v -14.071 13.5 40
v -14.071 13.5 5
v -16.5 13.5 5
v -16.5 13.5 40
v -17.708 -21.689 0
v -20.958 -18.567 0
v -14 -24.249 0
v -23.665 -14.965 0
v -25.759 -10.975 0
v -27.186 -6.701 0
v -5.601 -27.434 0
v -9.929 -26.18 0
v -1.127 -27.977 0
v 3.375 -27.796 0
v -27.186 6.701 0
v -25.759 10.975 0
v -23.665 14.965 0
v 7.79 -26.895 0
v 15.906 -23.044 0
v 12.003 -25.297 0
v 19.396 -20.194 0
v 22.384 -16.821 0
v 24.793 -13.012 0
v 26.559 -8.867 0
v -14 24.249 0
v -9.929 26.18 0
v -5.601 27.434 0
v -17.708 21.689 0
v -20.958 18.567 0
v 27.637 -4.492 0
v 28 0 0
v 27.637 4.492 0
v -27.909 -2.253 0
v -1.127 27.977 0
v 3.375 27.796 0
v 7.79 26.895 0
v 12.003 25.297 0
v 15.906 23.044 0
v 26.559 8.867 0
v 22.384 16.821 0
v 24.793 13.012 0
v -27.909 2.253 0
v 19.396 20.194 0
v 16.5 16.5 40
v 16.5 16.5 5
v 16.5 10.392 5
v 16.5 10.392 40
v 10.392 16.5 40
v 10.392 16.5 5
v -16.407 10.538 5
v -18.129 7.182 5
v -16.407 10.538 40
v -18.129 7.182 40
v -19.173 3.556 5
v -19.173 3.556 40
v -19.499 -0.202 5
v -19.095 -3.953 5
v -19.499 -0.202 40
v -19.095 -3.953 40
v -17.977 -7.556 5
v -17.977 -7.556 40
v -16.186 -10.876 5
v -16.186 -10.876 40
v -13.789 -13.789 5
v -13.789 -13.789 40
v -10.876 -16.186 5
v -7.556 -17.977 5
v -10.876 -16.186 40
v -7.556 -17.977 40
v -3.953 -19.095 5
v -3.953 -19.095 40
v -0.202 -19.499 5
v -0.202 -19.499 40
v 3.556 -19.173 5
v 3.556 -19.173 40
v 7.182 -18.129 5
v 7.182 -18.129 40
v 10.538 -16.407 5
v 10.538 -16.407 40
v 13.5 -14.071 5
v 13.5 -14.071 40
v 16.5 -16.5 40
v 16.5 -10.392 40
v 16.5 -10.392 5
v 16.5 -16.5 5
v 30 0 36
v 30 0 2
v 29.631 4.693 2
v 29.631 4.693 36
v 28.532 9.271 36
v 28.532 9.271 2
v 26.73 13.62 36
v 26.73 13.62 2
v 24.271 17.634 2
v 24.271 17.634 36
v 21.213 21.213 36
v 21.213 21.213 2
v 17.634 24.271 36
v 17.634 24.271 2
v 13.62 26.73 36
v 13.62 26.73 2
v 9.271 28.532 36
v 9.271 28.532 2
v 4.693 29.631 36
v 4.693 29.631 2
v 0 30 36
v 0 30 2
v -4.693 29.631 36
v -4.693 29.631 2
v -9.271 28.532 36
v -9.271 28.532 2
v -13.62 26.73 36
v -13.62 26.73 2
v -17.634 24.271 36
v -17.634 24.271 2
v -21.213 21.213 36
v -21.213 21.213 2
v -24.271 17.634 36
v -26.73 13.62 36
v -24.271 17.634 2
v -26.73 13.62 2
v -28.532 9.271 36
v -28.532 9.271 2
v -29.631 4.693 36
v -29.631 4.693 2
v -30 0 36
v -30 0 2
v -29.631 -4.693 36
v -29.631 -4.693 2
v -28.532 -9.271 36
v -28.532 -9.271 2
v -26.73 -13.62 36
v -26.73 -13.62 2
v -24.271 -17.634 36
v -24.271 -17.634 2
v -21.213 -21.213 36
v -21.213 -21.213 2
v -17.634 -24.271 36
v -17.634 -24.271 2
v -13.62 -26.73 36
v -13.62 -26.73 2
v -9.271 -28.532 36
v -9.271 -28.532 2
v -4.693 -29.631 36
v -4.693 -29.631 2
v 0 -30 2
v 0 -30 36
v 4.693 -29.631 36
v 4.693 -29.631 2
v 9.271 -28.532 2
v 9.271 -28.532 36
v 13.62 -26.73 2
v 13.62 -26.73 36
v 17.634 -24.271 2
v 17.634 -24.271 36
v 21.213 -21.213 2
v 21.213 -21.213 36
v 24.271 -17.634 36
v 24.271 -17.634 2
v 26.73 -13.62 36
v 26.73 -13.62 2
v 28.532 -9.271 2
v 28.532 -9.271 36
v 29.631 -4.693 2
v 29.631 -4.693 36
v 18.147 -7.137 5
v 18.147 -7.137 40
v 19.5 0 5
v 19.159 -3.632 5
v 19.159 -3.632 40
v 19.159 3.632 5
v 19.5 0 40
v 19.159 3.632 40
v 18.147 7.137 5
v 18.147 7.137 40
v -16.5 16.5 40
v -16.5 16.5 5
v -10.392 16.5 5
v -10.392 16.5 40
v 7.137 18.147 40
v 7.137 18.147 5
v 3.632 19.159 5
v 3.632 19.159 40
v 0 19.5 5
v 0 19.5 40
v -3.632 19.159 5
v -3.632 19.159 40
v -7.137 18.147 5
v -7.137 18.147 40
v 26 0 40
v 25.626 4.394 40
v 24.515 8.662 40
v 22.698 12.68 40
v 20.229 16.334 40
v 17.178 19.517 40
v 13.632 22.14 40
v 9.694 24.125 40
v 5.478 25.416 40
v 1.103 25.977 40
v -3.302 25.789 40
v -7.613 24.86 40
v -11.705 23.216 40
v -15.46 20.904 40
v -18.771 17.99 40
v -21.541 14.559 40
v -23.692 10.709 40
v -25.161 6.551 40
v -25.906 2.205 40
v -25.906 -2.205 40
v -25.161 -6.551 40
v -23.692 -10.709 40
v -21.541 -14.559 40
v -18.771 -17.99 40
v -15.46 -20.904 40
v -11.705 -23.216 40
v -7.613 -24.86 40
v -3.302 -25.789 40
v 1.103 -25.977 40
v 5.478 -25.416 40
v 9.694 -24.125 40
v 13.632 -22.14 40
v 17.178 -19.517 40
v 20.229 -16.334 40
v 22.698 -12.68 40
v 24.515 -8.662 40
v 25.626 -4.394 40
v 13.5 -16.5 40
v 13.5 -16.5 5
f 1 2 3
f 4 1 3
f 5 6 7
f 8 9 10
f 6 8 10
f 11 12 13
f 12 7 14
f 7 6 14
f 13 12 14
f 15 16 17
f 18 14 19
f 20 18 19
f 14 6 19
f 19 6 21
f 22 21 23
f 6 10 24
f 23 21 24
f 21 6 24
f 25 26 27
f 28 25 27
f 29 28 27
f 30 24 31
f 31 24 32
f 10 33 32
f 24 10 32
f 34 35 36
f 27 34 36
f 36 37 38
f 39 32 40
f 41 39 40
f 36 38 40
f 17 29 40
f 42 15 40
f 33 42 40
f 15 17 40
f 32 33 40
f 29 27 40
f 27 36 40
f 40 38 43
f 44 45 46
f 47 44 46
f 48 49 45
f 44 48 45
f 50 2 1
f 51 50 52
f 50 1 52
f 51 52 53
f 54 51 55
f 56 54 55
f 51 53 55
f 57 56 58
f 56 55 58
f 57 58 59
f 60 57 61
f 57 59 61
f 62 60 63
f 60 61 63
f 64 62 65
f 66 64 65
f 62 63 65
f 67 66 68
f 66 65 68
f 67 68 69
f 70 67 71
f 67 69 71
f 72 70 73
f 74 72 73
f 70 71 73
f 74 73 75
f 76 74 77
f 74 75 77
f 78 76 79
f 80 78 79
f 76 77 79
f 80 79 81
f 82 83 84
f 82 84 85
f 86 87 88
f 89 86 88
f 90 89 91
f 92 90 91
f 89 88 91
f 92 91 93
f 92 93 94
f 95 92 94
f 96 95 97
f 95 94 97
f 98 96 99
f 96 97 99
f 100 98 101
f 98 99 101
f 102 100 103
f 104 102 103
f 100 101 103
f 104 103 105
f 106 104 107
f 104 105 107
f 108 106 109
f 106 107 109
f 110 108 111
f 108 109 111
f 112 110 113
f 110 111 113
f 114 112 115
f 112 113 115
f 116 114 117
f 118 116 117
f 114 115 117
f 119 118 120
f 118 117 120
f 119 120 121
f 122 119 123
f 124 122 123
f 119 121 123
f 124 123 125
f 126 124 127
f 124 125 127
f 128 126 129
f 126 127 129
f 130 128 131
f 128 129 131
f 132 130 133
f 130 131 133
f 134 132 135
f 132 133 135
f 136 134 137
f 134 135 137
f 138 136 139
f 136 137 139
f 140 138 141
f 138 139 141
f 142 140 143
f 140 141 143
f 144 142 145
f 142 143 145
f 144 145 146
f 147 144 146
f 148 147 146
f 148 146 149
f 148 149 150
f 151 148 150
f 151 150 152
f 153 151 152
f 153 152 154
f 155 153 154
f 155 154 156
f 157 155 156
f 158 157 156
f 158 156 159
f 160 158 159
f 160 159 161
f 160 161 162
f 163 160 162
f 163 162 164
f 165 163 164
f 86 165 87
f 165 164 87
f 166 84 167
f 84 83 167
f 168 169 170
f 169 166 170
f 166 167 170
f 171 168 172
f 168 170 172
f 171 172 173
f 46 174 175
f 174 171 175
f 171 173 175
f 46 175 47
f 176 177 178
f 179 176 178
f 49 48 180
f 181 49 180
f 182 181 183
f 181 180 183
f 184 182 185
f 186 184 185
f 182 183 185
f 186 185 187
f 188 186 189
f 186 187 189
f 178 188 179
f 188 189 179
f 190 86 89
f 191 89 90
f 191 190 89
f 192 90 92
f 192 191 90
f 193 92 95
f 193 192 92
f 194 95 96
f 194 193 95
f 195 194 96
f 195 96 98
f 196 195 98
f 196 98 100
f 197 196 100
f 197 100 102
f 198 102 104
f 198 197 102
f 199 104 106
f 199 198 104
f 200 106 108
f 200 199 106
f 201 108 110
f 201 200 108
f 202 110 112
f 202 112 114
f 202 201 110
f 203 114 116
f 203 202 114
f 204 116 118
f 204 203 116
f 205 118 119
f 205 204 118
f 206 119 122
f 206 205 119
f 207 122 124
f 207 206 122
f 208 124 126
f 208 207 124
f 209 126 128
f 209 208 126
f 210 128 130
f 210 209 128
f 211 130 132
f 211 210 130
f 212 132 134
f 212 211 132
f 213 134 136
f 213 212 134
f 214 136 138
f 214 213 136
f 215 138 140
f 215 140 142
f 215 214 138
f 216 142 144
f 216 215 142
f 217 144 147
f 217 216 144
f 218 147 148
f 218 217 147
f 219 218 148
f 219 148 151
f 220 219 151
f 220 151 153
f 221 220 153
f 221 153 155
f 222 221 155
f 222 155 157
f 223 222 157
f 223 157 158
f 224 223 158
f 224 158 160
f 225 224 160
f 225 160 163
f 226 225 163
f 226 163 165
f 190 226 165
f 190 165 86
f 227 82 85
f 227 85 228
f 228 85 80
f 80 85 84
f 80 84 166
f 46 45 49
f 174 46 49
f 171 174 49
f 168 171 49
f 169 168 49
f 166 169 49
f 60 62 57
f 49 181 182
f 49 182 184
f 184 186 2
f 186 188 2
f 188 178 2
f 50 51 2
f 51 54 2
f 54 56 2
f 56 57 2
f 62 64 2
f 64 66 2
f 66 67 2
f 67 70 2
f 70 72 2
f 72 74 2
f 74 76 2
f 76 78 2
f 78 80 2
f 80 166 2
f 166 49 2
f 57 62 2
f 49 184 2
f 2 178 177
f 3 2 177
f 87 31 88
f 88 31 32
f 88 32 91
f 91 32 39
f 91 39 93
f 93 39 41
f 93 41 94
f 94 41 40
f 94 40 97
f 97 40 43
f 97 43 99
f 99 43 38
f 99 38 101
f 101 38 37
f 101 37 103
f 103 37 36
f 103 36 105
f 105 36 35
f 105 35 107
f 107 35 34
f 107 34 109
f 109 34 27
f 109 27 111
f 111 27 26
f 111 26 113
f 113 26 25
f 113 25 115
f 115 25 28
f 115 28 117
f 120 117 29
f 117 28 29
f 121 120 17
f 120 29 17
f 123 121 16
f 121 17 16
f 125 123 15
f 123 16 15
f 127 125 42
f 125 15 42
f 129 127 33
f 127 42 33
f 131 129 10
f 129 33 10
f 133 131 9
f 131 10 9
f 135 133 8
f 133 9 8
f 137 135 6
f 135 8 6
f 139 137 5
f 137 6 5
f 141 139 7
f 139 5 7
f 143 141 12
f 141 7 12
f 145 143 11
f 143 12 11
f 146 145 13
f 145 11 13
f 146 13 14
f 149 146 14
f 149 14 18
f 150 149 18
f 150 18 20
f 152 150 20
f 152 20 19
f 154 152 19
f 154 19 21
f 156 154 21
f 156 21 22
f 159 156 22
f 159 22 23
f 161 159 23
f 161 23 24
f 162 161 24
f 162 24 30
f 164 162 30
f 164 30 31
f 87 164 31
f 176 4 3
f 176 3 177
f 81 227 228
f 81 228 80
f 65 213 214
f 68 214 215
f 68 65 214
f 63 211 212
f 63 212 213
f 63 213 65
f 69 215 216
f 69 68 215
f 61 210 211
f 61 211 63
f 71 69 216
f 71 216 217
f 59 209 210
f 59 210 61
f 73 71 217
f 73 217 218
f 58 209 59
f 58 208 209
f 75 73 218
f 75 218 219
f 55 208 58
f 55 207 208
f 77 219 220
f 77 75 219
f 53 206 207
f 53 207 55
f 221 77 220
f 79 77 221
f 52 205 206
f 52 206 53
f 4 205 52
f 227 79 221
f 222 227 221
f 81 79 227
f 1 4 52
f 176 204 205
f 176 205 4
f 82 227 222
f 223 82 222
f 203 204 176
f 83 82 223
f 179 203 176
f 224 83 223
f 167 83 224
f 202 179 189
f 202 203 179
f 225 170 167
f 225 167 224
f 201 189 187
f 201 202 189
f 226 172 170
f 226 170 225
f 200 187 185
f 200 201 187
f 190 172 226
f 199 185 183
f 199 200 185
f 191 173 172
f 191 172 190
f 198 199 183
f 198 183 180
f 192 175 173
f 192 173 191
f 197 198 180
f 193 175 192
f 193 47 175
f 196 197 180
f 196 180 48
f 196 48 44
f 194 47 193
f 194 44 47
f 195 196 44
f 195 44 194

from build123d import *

# Parameters (mm, degrees)
SKETCH_R        = 30
PAD_DEPTH       = 40
POCKET_DEPTH    = 35
SKETCH002_R     = 19.5
POCKET001_DEPTH = 35
CHAMFER_SIZE    = 4
CHAMFER001_SIZE = 2


with BuildPart() as part:
    # Sketch → Pad (new body)
    with BuildSketch(Plane.XY):
        Circle(SKETCH_R)
    extrude(amount=PAD_DEPTH)

    # Sketch001 (on Face3 of Pad) → Pocket (cut)
    with BuildSketch(Plane.XY.offset(40)):
        Polygon((-16.5, 16.5), (16.5, 16.5), (16.5, -16.5), (13.5, -16.5), (13.5, 13.5), (-16.5, 13.5), align=None)
    extrude(amount=-POCKET_DEPTH, mode=Mode.SUBTRACT)

    # Sketch002 (on Face3 of Pocket) → Pocket001 (cut)
    with BuildSketch(Plane.XY.offset(40)):
        Circle(SKETCH002_R)
    extrude(amount=-POCKET001_DEPTH, mode=Mode.SUBTRACT)

    # Chamfer
    chamfer_edges = [part.edges().sort_by_distance(p)[0] for p in [
        (-30, 0, 40),
    ]]
    chamfer(chamfer_edges, length=CHAMFER_SIZE)

    # Chamfer001
    chamfer001_edges = [part.edges().sort_by_distance(p)[0] for p in [
        (-30, 0, 0),
    ]]
    chamfer(chamfer001_edges, length=CHAMFER001_SIZE)


solid = part.part
